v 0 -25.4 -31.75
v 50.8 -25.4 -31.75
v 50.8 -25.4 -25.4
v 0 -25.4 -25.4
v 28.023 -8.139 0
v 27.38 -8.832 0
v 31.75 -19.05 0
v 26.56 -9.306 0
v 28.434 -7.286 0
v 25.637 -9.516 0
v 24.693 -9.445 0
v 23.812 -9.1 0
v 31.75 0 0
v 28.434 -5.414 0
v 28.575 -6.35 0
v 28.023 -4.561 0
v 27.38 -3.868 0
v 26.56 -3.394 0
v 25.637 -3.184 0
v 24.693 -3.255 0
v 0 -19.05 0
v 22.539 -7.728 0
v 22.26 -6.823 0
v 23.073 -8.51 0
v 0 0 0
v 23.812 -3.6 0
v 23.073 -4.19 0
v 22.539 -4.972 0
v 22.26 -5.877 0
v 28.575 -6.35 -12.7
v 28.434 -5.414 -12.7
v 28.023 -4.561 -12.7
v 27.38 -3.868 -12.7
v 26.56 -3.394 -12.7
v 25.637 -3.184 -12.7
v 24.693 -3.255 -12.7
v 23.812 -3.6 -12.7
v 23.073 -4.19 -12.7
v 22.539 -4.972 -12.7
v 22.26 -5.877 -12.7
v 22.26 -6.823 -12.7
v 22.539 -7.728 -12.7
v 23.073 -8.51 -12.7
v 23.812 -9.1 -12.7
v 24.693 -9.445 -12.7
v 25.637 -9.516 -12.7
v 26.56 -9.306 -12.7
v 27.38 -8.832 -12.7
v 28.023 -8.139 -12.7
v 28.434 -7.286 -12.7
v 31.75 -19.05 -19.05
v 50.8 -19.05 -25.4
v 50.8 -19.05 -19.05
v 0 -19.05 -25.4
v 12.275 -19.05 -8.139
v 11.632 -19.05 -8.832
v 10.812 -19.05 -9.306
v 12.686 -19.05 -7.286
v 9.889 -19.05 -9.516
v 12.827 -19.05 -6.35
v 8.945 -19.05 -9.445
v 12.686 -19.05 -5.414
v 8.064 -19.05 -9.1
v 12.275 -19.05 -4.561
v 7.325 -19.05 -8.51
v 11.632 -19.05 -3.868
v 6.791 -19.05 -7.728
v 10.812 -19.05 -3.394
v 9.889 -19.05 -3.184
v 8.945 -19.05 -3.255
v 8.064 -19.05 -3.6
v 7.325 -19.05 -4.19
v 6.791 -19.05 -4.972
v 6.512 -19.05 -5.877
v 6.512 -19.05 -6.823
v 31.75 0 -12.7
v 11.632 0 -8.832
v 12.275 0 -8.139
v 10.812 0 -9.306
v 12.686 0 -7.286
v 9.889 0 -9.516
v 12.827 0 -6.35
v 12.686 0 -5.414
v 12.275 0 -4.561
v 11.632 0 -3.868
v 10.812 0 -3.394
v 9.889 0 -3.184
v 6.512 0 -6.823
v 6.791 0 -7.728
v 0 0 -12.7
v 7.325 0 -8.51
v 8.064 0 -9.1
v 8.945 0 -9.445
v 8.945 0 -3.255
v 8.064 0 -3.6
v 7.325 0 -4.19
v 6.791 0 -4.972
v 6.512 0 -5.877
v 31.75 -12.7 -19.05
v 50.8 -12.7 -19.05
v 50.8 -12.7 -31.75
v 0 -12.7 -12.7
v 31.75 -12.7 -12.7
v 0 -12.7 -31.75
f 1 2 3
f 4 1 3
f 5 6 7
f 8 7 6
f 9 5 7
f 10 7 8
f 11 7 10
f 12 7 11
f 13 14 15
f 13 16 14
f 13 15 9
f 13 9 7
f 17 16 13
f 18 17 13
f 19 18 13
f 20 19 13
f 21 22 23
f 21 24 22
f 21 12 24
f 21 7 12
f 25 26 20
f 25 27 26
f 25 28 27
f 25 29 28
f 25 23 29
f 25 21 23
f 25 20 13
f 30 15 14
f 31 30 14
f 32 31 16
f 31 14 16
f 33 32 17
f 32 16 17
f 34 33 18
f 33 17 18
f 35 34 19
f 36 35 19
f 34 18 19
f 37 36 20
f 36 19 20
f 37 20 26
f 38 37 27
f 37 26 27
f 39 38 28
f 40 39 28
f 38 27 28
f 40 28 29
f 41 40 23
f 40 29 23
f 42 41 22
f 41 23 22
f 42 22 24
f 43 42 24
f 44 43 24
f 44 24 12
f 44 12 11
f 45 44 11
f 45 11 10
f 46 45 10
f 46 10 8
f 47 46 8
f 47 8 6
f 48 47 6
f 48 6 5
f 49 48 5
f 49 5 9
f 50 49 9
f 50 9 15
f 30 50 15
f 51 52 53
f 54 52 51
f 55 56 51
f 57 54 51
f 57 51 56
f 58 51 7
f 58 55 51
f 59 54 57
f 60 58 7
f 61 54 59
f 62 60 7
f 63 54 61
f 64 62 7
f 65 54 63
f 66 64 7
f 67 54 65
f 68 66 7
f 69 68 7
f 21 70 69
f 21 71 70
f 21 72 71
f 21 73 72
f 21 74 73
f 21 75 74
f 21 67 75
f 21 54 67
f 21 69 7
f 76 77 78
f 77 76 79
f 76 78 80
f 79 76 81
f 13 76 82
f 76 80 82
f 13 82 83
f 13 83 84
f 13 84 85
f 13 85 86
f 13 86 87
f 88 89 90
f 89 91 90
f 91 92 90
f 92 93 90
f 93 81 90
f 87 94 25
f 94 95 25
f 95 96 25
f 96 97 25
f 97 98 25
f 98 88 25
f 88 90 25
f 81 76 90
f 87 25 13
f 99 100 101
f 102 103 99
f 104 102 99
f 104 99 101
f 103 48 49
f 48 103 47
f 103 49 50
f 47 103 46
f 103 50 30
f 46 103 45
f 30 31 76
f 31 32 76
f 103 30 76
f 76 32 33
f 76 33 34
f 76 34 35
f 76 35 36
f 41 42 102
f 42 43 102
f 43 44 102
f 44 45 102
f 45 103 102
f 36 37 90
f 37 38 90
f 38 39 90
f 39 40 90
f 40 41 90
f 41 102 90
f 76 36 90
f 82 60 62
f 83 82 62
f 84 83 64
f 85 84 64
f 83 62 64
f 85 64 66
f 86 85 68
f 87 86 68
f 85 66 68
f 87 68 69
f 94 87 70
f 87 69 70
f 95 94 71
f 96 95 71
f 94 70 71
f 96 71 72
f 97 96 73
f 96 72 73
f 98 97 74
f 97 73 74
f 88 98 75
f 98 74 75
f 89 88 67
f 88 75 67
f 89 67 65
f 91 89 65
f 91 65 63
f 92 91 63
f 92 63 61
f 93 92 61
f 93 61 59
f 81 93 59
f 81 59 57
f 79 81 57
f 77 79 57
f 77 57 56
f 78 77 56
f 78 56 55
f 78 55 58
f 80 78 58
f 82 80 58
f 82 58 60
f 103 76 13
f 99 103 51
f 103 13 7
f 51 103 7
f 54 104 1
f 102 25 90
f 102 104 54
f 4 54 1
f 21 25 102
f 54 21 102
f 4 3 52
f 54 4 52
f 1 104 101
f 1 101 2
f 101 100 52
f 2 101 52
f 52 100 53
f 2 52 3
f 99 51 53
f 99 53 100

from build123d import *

# Parameters (mm, degrees)
F0_W     = 19.05
F0_H     = 12.7
F1_DEPTH = 31.75
F2_W     = 6.35
F2_H     = 6.35
F3_DEPTH = 31.75
F5_DEPTH = 50.8
F6_R     = 3.175
F7_DEPTH = 31.751
F8_R     = 3.175
F9_DEPTH = 19.051


with BuildPart() as f1:
    # F0 (on Right) → F1 (new body)
    with BuildSketch(Plane.YZ):
        with Locations((-9.525, -6.35)):
            Rectangle(F0_W, F0_H)
    extrude(amount=F1_DEPTH)

    # F2 (on face) → F3 (join)
    with BuildSketch(Plane(origin=(0, 0, 0), x_dir=(0, -1, 0), z_dir=(-1, 0, 0))):
        with Locations((15.875, -15.875)):
            Rectangle(F2_W, F2_H)
    extrude(amount=-F3_DEPTH)

    # F4 (on face) → F5 (join)
    with BuildSketch(Plane(origin=(0, 0, 0), x_dir=(0, -1, 0), z_dir=(-1, 0, 0))):
        Polygon((19.05, -25.4), (19.05, -19.05), (12.7, -19.05), (12.7, -31.75), (25.4, -31.75), (25.4, -25.4), align=None)
    extrude(amount=-F5_DEPTH)

    # F6 (on face) → F7 (cut, through all)
    with BuildSketch(Plane.XY):
        with Locations((25.4, -6.35)):
            Circle(F6_R)
    extrude(amount=-F7_DEPTH, mode=Mode.SUBTRACT)

    # F8 (on face) → F9 (cut, through all)
    with BuildSketch(Plane.XZ.offset(19.05)):
        with Locations((9.652, -6.35)):
            Circle(F8_R)
    extrude(amount=-F9_DEPTH, mode=Mode.SUBTRACT)


solid = f1.part
